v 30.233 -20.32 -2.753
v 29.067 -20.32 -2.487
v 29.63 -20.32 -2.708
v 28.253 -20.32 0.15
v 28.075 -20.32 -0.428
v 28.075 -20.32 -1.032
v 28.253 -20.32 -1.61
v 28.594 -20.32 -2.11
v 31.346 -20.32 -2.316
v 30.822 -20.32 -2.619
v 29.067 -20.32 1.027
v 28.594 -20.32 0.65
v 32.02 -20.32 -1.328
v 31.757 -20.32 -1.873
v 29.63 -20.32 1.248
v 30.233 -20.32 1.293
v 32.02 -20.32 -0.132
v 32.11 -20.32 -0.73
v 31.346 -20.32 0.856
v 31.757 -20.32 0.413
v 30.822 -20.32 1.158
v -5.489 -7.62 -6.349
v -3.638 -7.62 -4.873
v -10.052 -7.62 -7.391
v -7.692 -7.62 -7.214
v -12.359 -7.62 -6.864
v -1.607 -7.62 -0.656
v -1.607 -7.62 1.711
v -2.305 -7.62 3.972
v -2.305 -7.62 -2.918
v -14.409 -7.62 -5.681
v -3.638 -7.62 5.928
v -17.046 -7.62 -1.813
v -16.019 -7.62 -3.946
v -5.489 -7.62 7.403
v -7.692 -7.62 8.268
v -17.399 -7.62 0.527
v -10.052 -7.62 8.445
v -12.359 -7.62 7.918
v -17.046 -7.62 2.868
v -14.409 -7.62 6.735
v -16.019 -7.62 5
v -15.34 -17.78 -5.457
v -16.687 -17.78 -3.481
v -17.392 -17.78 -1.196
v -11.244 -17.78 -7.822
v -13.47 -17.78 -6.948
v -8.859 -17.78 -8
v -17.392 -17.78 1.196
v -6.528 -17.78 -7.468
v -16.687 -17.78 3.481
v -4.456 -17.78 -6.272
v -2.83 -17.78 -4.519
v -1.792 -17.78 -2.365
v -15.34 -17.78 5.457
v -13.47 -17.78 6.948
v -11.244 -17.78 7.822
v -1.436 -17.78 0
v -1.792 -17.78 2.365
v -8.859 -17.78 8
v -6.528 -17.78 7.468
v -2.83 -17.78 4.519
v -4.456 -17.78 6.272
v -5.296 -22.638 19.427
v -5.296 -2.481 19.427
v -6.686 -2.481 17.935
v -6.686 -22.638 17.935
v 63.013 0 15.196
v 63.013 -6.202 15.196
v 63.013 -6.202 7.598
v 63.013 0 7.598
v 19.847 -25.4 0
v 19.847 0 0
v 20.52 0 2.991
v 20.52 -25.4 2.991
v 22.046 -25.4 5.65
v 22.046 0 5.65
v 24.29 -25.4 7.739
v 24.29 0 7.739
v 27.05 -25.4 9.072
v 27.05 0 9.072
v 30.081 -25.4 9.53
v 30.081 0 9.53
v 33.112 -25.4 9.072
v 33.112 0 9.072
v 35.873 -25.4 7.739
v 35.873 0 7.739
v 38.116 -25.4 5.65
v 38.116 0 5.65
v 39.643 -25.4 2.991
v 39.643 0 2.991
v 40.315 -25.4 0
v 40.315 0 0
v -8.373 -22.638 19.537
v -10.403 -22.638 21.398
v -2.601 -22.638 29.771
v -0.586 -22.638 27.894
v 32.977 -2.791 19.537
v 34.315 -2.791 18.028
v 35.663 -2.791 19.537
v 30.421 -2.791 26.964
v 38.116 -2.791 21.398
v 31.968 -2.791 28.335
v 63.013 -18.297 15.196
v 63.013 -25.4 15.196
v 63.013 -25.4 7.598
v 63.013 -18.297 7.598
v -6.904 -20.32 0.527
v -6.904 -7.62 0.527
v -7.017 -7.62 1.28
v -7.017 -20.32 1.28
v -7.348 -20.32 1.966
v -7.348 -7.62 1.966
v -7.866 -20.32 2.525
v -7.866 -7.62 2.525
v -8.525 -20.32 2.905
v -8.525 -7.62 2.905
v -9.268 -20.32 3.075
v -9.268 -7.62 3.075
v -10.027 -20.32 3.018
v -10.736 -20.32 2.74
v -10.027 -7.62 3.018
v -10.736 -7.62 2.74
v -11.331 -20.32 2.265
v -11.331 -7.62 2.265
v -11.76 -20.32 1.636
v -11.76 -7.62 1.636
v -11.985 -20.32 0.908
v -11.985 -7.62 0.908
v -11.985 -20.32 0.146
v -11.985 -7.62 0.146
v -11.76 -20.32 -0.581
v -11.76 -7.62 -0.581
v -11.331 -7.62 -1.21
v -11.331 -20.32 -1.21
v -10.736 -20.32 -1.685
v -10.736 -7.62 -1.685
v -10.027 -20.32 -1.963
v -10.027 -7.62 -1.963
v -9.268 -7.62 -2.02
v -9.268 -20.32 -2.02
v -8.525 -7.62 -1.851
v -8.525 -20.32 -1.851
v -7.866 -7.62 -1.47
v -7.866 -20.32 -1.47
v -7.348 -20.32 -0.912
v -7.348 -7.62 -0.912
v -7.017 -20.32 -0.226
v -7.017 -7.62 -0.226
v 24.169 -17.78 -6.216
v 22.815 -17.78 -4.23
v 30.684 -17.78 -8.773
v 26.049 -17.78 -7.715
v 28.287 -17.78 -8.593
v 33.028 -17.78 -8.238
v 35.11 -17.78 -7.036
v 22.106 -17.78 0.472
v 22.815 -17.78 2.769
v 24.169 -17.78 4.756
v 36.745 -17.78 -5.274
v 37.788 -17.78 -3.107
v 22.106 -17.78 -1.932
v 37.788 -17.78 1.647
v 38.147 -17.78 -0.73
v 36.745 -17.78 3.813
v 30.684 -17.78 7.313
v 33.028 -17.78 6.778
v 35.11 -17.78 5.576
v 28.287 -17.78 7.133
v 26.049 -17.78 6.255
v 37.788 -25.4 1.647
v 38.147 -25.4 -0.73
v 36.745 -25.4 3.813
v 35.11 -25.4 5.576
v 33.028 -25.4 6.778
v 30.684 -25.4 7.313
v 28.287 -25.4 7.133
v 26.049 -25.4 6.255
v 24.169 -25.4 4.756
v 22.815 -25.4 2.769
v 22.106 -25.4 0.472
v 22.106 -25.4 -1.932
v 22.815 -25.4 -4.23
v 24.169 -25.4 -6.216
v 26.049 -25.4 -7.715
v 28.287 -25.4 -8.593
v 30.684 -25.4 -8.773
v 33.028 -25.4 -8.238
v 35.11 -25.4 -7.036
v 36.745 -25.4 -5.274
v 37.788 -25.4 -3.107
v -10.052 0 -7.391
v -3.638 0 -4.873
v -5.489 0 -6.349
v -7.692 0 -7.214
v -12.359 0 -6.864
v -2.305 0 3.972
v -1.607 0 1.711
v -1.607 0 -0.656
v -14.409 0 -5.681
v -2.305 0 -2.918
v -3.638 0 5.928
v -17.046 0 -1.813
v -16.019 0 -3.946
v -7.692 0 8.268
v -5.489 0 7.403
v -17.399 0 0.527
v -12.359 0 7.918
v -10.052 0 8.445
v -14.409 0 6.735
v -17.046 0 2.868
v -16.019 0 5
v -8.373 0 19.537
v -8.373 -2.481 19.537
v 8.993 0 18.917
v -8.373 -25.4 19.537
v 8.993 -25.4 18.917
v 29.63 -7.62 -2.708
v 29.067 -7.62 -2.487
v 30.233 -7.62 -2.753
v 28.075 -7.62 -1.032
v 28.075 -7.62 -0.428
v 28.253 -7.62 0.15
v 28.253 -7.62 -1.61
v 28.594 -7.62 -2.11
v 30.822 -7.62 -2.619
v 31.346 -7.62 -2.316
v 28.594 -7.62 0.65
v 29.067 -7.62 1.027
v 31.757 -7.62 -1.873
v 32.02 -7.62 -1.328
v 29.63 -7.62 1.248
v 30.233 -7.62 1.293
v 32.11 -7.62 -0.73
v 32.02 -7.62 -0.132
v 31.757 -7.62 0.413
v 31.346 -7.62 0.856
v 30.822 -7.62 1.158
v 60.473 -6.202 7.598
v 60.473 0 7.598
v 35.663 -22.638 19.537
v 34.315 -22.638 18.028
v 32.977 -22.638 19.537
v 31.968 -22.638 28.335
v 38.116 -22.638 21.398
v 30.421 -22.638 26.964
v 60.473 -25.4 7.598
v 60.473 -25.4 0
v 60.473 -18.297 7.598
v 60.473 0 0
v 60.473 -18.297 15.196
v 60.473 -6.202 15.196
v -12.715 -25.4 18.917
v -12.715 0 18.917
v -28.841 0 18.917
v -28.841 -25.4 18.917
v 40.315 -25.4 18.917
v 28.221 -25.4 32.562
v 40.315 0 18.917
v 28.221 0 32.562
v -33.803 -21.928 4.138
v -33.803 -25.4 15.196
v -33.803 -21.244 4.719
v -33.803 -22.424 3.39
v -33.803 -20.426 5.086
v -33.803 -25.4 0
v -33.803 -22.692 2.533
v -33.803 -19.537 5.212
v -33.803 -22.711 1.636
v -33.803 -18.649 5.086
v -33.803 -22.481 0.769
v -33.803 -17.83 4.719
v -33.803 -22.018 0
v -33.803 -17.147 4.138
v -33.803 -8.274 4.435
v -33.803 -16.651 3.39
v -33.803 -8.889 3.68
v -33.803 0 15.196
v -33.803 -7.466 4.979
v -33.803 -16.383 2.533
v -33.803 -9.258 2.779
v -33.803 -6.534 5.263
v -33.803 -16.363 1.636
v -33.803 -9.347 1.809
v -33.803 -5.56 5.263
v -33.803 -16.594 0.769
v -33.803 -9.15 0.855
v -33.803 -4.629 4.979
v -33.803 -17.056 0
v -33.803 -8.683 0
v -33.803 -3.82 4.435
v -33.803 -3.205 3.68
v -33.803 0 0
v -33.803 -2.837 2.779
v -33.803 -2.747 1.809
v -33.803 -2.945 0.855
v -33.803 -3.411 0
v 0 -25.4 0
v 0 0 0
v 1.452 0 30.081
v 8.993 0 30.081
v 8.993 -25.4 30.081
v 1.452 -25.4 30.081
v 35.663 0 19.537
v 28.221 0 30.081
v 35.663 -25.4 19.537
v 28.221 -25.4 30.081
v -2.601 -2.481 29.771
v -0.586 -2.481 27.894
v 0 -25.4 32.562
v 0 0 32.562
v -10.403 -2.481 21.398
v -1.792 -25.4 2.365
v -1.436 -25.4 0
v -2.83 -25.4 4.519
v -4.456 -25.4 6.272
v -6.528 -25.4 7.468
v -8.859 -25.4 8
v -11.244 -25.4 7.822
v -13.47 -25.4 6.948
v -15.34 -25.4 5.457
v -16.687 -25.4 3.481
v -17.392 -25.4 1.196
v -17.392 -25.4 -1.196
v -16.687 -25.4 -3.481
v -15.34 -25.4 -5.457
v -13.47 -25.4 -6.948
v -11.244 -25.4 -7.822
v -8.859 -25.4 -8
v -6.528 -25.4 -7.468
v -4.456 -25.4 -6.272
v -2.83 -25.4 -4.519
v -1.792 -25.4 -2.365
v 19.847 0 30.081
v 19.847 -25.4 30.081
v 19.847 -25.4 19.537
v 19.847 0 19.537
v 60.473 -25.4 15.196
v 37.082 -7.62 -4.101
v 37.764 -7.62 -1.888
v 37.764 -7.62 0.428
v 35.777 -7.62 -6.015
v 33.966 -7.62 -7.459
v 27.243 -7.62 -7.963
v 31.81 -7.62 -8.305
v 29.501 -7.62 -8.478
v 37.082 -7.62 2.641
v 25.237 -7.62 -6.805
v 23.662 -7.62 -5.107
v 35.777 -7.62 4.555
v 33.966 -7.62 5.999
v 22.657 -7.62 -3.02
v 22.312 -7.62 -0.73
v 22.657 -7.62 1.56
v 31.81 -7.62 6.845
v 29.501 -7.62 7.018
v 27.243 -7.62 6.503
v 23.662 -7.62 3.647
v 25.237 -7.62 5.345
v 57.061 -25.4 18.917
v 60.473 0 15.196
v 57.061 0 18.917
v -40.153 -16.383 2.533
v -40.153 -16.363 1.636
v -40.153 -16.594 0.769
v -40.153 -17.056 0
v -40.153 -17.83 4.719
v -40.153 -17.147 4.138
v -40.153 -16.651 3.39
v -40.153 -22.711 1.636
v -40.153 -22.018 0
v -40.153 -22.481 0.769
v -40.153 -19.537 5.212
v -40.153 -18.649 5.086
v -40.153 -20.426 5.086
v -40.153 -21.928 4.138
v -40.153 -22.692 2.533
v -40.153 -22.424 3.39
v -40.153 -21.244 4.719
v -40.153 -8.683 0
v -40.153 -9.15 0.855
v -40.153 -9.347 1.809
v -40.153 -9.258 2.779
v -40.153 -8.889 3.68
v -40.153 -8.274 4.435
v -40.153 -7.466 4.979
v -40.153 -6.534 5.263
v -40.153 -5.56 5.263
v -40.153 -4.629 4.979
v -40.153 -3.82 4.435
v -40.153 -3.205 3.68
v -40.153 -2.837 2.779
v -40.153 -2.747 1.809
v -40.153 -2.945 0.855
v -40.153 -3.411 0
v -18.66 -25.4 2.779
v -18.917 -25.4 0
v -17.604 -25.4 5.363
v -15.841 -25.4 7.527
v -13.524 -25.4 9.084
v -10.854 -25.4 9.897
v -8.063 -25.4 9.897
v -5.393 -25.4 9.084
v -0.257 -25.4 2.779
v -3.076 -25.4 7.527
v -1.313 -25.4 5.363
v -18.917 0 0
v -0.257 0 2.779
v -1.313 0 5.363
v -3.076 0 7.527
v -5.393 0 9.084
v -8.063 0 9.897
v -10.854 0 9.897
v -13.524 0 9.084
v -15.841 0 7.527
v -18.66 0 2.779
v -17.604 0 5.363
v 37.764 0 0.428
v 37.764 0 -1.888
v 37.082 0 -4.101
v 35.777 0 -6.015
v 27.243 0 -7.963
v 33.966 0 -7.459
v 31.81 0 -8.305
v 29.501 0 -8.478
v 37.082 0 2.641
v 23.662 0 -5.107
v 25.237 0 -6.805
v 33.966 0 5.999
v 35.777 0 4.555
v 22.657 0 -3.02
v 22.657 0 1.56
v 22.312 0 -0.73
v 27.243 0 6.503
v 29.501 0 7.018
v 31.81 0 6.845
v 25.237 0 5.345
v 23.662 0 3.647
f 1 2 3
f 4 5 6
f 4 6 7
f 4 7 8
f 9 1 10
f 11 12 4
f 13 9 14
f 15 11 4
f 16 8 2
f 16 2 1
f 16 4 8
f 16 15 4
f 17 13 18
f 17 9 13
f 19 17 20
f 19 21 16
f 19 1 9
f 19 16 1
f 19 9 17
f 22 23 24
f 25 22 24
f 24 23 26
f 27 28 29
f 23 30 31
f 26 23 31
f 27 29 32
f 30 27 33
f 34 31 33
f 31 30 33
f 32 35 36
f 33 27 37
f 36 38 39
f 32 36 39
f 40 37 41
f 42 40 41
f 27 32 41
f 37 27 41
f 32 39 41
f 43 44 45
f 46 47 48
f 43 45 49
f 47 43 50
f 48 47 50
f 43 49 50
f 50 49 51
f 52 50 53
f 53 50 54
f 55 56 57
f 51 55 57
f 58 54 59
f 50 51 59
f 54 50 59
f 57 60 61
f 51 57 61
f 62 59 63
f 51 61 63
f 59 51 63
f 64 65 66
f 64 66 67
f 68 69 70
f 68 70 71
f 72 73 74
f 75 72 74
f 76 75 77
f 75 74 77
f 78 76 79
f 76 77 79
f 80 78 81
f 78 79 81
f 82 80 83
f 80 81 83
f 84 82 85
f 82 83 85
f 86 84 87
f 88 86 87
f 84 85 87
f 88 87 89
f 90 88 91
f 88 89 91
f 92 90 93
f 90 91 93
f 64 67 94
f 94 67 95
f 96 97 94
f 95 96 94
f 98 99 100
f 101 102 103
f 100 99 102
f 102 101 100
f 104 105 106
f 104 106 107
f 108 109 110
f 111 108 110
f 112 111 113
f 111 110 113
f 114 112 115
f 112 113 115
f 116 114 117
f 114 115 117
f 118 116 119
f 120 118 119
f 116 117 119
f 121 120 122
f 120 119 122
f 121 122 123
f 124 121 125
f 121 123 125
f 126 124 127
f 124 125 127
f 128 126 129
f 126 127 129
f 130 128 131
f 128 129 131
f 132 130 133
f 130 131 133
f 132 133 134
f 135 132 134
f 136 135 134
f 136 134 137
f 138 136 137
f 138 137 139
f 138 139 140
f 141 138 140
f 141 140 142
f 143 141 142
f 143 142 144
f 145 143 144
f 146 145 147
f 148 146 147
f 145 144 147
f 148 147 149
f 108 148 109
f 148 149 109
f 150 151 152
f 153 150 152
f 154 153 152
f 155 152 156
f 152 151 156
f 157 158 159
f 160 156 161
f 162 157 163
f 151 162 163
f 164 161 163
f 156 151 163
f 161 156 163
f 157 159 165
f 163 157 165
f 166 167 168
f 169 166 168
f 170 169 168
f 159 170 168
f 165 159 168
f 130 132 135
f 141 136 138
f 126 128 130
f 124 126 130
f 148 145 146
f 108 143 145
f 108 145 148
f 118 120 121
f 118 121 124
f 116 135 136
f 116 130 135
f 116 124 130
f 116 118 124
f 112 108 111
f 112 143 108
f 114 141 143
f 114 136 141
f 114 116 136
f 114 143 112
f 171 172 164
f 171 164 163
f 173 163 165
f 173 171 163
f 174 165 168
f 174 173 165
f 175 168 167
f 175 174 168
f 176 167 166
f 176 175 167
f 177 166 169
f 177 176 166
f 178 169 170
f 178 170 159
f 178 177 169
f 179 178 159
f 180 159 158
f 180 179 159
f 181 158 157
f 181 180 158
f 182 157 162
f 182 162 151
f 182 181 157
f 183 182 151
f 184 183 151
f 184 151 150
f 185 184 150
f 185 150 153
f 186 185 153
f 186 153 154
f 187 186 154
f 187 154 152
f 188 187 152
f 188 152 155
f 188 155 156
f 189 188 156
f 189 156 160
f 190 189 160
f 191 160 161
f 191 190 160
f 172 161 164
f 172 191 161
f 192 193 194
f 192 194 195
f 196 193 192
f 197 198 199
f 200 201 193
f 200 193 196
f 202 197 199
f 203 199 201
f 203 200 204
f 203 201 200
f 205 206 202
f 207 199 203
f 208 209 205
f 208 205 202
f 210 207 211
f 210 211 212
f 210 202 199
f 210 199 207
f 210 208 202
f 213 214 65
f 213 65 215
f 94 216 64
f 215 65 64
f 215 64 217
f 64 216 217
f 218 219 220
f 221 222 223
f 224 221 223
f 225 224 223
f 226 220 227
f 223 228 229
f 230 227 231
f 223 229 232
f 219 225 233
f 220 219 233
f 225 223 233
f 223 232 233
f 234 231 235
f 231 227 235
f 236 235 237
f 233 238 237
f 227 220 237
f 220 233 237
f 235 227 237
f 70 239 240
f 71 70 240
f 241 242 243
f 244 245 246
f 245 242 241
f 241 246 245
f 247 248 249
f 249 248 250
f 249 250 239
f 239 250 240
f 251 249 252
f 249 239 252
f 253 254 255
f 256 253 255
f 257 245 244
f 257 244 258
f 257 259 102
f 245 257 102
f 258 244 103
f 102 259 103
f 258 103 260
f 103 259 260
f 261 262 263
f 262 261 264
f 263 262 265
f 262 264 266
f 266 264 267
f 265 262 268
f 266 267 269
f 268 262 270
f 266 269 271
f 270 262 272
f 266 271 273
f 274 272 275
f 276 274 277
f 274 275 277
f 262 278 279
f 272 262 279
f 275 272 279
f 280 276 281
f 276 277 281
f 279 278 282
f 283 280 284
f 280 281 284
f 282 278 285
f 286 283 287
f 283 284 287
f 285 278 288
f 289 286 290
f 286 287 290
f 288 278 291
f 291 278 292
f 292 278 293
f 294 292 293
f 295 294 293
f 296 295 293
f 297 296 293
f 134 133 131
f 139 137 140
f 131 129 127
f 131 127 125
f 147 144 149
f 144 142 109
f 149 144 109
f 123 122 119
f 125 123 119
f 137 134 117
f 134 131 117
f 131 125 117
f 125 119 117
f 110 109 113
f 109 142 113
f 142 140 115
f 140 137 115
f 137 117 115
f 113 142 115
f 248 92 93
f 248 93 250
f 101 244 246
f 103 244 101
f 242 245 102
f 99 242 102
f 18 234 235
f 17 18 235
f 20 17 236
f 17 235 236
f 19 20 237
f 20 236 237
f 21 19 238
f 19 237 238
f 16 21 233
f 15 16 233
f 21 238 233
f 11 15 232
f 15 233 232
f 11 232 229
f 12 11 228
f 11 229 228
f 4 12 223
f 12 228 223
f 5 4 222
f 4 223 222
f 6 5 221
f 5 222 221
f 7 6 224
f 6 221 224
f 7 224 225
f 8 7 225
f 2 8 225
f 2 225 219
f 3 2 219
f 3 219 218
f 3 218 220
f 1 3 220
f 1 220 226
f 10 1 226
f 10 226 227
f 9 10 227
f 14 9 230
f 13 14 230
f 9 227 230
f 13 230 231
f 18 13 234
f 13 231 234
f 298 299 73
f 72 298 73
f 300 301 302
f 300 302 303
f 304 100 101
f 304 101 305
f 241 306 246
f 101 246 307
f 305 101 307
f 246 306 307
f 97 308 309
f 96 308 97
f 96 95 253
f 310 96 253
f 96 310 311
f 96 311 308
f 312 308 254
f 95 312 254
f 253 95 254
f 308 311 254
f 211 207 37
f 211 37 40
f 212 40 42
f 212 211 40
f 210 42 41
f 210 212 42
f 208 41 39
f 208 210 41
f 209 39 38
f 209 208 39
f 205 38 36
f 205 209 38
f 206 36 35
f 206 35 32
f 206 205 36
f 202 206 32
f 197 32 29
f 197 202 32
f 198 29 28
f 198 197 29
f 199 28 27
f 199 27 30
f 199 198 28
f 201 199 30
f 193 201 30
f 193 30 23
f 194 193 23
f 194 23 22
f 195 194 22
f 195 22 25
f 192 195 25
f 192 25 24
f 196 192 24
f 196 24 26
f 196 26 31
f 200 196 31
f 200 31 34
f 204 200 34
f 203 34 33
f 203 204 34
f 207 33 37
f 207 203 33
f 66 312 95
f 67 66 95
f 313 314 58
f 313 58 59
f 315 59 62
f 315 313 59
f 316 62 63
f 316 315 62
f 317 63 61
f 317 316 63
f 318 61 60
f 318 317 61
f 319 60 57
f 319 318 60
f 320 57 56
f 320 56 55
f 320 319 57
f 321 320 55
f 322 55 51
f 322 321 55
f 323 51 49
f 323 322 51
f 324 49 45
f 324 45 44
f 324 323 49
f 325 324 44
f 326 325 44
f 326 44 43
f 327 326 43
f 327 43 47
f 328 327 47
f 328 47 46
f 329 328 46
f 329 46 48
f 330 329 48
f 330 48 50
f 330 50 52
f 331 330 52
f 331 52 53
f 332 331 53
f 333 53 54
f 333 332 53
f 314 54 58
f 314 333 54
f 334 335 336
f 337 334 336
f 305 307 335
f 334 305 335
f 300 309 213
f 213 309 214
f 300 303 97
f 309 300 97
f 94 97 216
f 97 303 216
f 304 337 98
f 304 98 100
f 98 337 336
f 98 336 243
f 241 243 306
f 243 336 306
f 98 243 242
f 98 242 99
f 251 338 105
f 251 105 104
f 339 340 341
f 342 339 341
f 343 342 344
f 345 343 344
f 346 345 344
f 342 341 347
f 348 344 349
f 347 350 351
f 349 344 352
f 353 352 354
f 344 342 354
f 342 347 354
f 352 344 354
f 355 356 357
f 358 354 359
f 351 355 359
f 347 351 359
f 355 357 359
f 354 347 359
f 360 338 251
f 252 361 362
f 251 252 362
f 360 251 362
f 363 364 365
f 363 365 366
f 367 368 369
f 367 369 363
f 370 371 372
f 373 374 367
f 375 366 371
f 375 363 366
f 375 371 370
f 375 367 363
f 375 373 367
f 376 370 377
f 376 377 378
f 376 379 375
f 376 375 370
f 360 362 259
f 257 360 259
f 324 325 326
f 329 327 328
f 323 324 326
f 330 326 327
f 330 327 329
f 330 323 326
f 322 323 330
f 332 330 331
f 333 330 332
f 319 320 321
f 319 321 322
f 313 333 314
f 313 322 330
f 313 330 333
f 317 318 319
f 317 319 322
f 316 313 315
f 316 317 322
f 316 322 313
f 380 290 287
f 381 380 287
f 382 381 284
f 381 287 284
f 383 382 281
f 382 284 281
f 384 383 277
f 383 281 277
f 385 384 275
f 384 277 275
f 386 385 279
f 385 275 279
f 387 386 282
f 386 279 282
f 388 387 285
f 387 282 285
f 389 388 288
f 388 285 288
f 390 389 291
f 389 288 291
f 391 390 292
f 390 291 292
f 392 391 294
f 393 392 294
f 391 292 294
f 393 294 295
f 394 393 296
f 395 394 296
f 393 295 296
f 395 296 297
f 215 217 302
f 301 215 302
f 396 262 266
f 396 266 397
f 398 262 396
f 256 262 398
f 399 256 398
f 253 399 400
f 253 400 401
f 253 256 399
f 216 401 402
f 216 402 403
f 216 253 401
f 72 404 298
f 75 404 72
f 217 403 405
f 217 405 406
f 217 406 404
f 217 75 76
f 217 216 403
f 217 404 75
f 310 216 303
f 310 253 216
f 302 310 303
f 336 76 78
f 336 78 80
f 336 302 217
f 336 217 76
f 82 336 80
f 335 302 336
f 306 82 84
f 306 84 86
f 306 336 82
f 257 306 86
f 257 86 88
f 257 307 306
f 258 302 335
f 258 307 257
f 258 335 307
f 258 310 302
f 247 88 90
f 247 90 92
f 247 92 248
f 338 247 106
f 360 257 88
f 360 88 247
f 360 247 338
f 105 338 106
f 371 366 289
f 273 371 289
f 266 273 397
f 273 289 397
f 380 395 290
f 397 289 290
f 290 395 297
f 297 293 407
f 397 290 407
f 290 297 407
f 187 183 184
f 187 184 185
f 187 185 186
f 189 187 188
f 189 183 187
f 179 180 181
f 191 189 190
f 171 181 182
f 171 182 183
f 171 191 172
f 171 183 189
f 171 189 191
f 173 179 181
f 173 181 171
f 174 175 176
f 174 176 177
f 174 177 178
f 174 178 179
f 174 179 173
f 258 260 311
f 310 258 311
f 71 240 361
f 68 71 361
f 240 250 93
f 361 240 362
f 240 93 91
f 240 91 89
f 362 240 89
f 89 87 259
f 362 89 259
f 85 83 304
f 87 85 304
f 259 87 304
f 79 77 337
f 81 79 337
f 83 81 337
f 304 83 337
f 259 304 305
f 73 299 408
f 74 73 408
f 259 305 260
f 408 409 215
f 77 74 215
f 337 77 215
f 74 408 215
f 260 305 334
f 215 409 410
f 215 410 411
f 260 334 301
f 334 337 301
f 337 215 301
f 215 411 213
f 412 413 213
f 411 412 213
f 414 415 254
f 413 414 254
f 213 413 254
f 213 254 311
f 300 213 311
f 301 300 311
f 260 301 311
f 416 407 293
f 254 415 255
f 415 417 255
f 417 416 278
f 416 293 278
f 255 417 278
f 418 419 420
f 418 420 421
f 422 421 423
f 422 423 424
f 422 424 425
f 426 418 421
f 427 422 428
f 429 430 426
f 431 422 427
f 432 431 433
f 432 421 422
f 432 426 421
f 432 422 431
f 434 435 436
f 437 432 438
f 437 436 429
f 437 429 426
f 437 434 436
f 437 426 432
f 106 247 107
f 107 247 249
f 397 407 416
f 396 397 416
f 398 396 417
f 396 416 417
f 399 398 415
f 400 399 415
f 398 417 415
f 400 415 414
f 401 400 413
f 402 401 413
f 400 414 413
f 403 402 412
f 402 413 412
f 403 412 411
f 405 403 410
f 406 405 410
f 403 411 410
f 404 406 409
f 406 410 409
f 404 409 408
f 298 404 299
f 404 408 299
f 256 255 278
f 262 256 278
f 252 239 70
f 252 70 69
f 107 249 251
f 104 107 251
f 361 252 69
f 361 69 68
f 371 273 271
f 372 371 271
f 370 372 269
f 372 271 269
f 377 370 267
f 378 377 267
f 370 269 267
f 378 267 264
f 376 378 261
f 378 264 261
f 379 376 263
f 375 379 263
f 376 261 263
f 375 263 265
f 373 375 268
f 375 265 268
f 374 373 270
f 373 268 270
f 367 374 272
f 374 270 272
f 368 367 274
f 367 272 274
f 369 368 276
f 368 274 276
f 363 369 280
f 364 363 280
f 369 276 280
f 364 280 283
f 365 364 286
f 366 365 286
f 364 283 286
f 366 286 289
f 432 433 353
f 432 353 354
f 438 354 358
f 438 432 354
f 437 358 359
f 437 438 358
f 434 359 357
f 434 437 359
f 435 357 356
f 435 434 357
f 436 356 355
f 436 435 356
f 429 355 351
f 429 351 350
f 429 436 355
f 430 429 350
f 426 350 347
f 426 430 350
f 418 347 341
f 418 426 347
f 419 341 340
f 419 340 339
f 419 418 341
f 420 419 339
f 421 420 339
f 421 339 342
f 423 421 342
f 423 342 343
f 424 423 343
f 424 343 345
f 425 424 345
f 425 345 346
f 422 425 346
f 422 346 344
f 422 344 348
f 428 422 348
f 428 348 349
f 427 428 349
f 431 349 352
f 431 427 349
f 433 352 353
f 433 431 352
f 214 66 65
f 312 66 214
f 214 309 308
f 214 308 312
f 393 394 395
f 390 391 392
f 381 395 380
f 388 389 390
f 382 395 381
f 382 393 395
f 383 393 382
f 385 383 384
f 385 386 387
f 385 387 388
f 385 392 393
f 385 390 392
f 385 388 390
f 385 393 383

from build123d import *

# Parameters (mm, degrees)
F1_DEPTH  = 25.4
F2_R      = 8.022666145
F3_DEPTH  = 7.62
F2_R_2    = 8.0655138607
F4_R      = 7.7696882193
F5_DEPTH  = 7.62
F4_R_2    = 7.940066568
F6_R      = 2.0287079895
F7_DEPTH  = 12.7
F8_R      = 2.5547140385
F9_DEPTH  = 12.7
F10_W     = 6.2023252249
F10_H     = 7.597848773
F10_W_2   = 7.1031398416
F11_DEPTH = 2.54
F13_DEPTH = 25.4
F14_W     = 19.8474398348
F14_H     = 9.2695616186
F15_DEPTH = 5.08
F16_W     = 20.157556748
F16_H     = 11.4448424429
F17_DEPTH = 5.08
F19_DEPTH = 6.35


with BuildPart() as f1:
    # F0 (on Front) → F1 (new body)
    with BuildSketch(Plane.XZ):
        with BuildLine():
            ThreePointArc((-18.9170930535, 0), (-9.4585465267, 10.0004262087), (0, 0))
            Line((0, 0), (19.8474433273, 0))
            ThreePointArc((19.8474433273, 0), (30.0812805071, 9.5297813415), (40.315117687, 0))
            Line((40.315117687, 0), (60.4726709425, 0))
            Line((60.4726709425, 0), (60.4726709425, 15.195697546))
            Line((60.4726709425, 15.195697546), (57.0613928139, 18.9170930535))
            Line((57.0613928139, 18.9170930535), (40.315117687, 18.9170930535))
            Line((40.315117687, 18.9170930535), (28.2205808908, 32.5622074306))
            Line((28.2205808908, 32.5622074306), (0, 32.5622074306))
            Line((0, 32.5622074306), (-12.7147668973, 18.9170930535))
            Line((-12.7147668973, 18.9170930535), (-28.8408137858, 18.9170930535))
            Line((-28.8408137858, 18.9170930535), (-33.8026732206, 15.195697546))
            Line((-33.8026732206, 15.195697546), (-33.8026732206, 0))
            Line((-33.8026732206, 0), (-18.9170930535, 0))
        make_face()
    extrude(amount=F1_DEPTH)

    # F10 (on face) → F11 (join)
    with BuildSketch(Plane.YZ.offset(60.4726709425)):
        with Locations((-3.1011626124, 11.3967731595)):
            Rectangle(F10_W, F10_H)
        with Locations((-21.8484300792, 11.3967731595)):
            Rectangle(F10_W_2, F10_H)
    extrude(amount=F11_DEPTH)

    # F12 (on face) → F13 (cut)
    with BuildSketch(Plane.XZ.offset(25.4)):
        Polygon((19.8474414647, 19.5373259485), (35.6633737683, 19.5373259485), (28.2205808908, 30.0812795758), (19.8474414647, 30.0812795758), align=None)
        Polygon((1.4519082894, 30.0812795758), (-8.3731403574, 19.5373259485), (8.9933732525, 18.9170930535), (8.9933732525, 30.0812795758), align=None)
    extrude(amount=-F13_DEPTH, mode=Mode.SUBTRACT)

    # F14 (on face) → F15 (cut)
    with BuildSketch(Plane(origin=(31.9675383997, 0, 28.3348720116), x_dir=(0, 1, 0), z_dir=(0.7483468413, 0, 0.6633076248))):
        with Locations((-12.7147686435, -4.6347808093)):
            Rectangle(F14_W, F14_H)
    extrude(amount=-F15_DEPTH, mode=Mode.SUBTRACT)

    # F16 (on face) → F17 (cut)
    with BuildSketch(Plane(origin=(-16.2405923707, 0, 15.1332807156), x_dir=(0, -1, 0), z_dir=(-0.7316079273, 0, 0.6817256345))):
        with Locations((12.5597101869, 14.2854014412)):
            Rectangle(F16_W, F16_H)
    extrude(amount=-F17_DEPTH, mode=Mode.SUBTRACT)

    # F18 (on face) → F19 (join)
    with BuildSketch(Plane(origin=(-33.8026732206, 0, 0), x_dir=(0, -1, 0), z_dir=(-1, 0, 0))):
        with BuildLine():
            ThreePointArc((22.0182556659, 0), (19.5373259485, 5.2123611179), (17.0563962311, 0))
            Line((17.0563962311, 0), (22.0182556659, 0))
        make_face()
        with BuildLine():
            Line((3.4112804569, 0), (8.6832558736, 0))
            ThreePointArc((8.6832558736, 0), (6.0472681653, 5.2985844911), (3.4112804569, 0))
        make_face()
    extrude(amount=F19_DEPTH)


with BuildPart() as f3:
    # F2 (on face) → F3 (new body)
    with BuildSketch(Plane.XZ.offset(25.4)):
        with Locations((-9.4585465267, 0)):
            Circle(F2_R)
    extrude(amount=-F3_DEPTH)


with BuildPart() as f3b:
    # F2 (on face) → F3, piece 2 (new body)
    with BuildSketch(Plane.XZ.offset(25.4)):
        with Locations((30.0812805071, -0.7300634982)):
            Circle(F2_R_2)
    extrude(amount=-F3_DEPTH)


with BuildPart() as f5:
    # F4 (on face) → F5 (new body)
    with BuildSketch(Plane(origin=(0, 0, 0), x_dir=(-1, 0, 0), z_dir=(0, 1, 0))):
        with Locations((-30.0812805071, -0.7300634982)):
            Circle(F4_R)
    extrude(amount=-F5_DEPTH)


with BuildPart() as f5b:
    # F4 (on face) → F5, piece 2 (new body)
    with BuildSketch(Plane(origin=(0, 0, 0), x_dir=(-1, 0, 0), z_dir=(0, 1, 0))):
        with Locations((9.4585465267, 0.5271986282)):
            Circle(F4_R_2)
    extrude(amount=-F5_DEPTH)


with BuildPart() as f7:
    # F6 (on face) → F7 (new body)
    with BuildSketch(Plane.XZ.offset(7.62)):
        with Locations((30.0812805071, -0.7300634982)):
            Circle(F6_R)
    extrude(amount=F7_DEPTH)


with BuildPart() as f9:
    # F8 (on face) → F9 (new body)
    with BuildSketch(Plane.XZ.offset(7.62)):
        with Locations((-9.4585465267, 0.5271986282)):
            Circle(F8_R)
    extrude(amount=F9_DEPTH)


solid = Compound([f1.part, f3.part, f3b.part, f5.part, f5b.part, f7.part, f9.part])
